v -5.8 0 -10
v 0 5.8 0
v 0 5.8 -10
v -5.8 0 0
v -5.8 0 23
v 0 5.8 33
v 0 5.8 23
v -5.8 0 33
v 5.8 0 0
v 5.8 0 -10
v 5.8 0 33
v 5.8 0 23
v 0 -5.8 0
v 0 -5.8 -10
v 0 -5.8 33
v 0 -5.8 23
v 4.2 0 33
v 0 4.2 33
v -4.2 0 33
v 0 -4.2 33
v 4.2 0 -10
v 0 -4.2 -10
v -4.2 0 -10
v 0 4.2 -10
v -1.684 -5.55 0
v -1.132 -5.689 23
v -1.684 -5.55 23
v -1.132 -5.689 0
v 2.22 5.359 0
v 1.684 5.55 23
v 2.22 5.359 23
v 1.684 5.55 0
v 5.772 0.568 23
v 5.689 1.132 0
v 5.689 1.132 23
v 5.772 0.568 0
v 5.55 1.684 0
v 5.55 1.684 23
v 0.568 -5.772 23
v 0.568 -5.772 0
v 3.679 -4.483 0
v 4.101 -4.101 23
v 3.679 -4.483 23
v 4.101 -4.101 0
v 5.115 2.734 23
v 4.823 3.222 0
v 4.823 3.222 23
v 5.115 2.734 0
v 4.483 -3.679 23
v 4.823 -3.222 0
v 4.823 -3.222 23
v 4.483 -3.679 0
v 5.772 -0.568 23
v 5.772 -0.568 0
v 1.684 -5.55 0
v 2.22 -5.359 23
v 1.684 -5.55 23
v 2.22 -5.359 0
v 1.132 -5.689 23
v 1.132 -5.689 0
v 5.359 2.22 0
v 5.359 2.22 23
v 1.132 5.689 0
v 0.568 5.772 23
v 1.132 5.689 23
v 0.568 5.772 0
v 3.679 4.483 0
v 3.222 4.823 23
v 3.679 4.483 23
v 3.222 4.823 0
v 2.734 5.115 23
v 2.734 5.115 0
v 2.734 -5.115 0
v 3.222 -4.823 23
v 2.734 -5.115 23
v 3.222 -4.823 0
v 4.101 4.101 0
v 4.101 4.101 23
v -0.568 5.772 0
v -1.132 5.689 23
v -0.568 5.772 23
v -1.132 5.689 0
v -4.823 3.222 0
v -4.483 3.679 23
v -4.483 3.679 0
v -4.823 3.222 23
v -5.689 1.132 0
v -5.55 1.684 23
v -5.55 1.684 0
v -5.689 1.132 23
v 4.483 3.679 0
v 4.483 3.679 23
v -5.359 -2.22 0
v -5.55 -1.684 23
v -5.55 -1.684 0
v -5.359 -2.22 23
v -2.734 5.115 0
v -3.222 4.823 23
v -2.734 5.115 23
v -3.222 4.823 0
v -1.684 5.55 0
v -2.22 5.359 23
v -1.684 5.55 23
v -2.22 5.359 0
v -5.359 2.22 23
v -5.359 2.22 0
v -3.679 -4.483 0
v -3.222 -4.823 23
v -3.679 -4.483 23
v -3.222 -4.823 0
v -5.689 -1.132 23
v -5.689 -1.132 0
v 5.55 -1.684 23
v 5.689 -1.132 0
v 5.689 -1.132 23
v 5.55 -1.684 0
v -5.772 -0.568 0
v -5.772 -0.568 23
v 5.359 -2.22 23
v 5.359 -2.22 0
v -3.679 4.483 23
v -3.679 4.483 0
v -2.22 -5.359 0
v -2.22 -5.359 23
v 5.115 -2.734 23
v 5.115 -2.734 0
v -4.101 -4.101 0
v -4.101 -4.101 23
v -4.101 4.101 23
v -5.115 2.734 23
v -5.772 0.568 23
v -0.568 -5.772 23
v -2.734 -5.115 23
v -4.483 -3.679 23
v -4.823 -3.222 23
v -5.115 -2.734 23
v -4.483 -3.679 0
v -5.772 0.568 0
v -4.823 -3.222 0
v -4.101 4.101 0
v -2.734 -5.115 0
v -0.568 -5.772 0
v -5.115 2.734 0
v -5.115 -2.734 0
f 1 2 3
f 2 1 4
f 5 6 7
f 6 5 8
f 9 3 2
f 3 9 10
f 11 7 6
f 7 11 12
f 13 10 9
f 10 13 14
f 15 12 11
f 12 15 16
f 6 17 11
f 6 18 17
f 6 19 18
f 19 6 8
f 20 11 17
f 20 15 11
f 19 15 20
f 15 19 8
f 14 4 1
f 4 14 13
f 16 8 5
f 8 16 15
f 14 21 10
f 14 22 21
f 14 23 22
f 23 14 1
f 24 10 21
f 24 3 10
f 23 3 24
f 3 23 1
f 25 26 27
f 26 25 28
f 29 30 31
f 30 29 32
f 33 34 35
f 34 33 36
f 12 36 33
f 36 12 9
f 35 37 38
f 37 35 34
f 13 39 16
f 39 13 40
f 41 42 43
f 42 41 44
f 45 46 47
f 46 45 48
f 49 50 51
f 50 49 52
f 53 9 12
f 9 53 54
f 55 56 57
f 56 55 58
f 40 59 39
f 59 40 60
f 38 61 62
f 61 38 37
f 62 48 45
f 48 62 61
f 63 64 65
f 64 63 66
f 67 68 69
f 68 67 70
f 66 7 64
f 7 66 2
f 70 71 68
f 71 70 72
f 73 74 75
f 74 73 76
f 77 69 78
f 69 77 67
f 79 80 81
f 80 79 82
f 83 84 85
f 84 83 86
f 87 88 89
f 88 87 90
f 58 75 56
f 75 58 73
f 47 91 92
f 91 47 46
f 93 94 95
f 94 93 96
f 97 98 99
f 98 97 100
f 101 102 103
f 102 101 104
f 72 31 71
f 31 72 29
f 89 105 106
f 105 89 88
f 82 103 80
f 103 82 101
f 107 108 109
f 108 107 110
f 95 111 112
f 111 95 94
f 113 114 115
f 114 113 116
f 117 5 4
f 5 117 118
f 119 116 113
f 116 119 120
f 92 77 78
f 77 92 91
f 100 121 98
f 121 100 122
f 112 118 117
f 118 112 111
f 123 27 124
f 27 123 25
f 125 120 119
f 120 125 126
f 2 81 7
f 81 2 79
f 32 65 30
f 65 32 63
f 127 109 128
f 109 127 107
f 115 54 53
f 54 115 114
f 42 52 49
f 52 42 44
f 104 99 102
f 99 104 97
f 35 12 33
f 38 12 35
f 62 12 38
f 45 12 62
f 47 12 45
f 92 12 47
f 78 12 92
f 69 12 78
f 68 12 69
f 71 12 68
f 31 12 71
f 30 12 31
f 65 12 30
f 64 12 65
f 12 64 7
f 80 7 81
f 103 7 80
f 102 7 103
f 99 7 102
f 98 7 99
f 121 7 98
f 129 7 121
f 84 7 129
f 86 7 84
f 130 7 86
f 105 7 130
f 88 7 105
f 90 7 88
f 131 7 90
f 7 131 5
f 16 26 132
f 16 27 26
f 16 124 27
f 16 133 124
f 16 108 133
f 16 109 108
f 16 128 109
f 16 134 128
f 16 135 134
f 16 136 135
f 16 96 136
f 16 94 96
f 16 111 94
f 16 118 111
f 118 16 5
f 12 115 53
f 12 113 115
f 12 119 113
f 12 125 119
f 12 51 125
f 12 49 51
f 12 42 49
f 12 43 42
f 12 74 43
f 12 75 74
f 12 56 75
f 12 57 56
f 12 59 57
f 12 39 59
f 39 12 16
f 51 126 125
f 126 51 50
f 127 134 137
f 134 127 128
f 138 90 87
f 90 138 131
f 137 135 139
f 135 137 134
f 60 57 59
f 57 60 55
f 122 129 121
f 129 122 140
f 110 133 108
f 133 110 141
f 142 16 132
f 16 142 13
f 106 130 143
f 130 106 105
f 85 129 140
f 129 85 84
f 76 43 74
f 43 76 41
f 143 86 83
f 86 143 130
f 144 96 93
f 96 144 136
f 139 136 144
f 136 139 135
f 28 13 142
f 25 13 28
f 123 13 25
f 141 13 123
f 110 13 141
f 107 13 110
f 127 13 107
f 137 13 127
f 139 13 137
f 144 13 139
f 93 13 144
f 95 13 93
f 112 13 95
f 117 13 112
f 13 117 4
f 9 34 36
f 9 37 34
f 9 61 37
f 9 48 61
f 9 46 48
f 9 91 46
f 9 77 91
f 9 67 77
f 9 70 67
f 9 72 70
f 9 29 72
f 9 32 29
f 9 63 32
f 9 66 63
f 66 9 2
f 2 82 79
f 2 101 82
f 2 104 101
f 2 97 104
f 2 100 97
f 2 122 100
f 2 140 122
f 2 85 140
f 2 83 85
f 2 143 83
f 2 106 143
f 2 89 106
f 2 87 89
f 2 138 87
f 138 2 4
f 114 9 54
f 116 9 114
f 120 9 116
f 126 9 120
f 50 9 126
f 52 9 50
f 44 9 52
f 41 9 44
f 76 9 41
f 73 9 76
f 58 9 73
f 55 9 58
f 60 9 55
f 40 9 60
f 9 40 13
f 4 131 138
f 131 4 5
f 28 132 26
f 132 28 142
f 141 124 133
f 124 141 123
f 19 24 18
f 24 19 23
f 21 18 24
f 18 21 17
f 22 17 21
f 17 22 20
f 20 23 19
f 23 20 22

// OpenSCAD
$fn=64;
t=1.6;
r=20;
ct=17;

baseWidth=300;
baseHeight=130;

positions=[
  [-baseWidth/2,-baseHeight/2,0],
  [0,baseHeight/2,0],
  [baseWidth/2,-baseHeight/2,0]
];

a=20;
angles=[a,0,-a];
masks=["./Monomon_-_Mask_centered.stl", "./Lurien_-_Mask_centered.stl", "./Herrah_-_Mask_centered.stl"];

postBaseR=6;

holeFudge=0.2;
nutR=3.2;
screwR=1.75;

powerPlitterBox_ix=21;
powerPlitterBox_iy=21;
powerPlitterBox_iz=15;

// color("blue") translate([0,-236,-2]) cube([10,150,2]);
// color("blue") translate([0,84,-2]) cube([10,80,2]);
// color("blue") translate([170,-70,-2]) cube([80,10,2]);

// translate([0,0,25]) color("white") masks();

// translate([-250,-236,0]) canvas();
// translate([0,0,5]) color("gray") backMount();
// translate([0,0,15]) holes() connector();

post();
// lightHolder();

//  color("white") postLight();
// postMaskConnection();
// glueCross();


// translate([0,0,10]) difference() {
//    mask();
//   cube([1000,1000,1000]);
//  }

// translate([0,0,10]) mountHelper();

// canvasBracket();
// translate([0,70,0] ) canvasBracketShort();
//  powerSplitterBox();
//  color("green") translate([powerPlitterBox_ix+t*2,0,powerPlitterBox_iz+t*2]) rotate([0,180,0]) powerSplitterBoxLid();

module powerSplitterBox() {
  ix=powerPlitterBox_ix;
  iy=powerPlitterBox_iy;
  iz=powerPlitterBox_iz;
  difference() {
    cube([ix+t*2,iy+t*2,iz+t]);
    translate([t,t,t]) cube([ix,iy,iz+1]);
    translate([t+3,-1,t+4]) cube([10,10,20]);
    translate([9.7,iy-3,t+10]) cube([5,7,12.2]);
  }
}

module powerSplitterBoxLid() {
  ix=powerPlitterBox_ix;
  iy=powerPlitterBox_iy;
  difference() {
    union() {
      cube([ix+t*2,iy+t*2,t]);
      translate([ix-10+t-3,0,t]) cube([10,t,5]);
      translate([t,t,t]) difference() {
          cube([ix,iy,10]);
          translate([t,t,-0.1]) cube([ix-t*2,iy-t*2,10.2]);
          translate([8,-1,0]) cube([10,5,20]);
      }
    }
    translate([9.5,iy-5,-0.1]) cube([5,9,12.2]);
    translate([6,iy-7.5,-0.1]) cube([14,3,12.2]);
  }
}

module canvasBracket() {
  difference() {
    union() {
      cube([90,40,t]);
      translate([0,7,0]) bracketBracket();
      translate([0,33-t,0]) bracketBracket();
      translate([-t,-5,0]) cube([t,50,10]);
      translate([-t,-5,5]) rotate([0,90,0]) cylinder(r=5,h=t+3);
      translate([-t,45,5]) rotate([0,90,0]) cylinder(r=5,h=t+3);
    }
    translate([60,20,-0.1]) cylinder(r=5,h=t+0.2);
    translate([60,15,-0.1]) cube([30.1,10,t+0.2]);
    translate([30,20,-0.1]) cylinder(r=5,h=t+0.2);
    translate([-0.1,15,-0.1]) cube([30.1,10,t+0.2]);

    translate([-t-0.1,-5,5]) rotate([0,90,0]) cylinder(r=2,h=10);
    translate([-t-0.1,45,5]) rotate([0,90,0]) cylinder(r=2,h=10);
    translate([0,-5,5]) rotate([0,90,0]) cylinder(r1=2, r2=3.5, h=3.1);
    translate([0,45,5]) rotate([0,90,0]) cylinder(r1=2, r2=3.5,h=3.1);
  }
}


module canvasBracketShort() {
  difference() {
    union() {
      cube([70,40,t]);
      translate([0,7,0]) bracketBracket(20);
      translate([0,33-t,0]) bracketBracket(20);
      translate([-t,-5,0]) cube([t,50,10]);
      translate([-t,-5,5]) rotate([0,90,0]) cylinder(r=5,h=t+3);
      translate([-t,45,5]) rotate([0,90,0]) cylinder(r=5,h=t+3);
    }
    translate([50,20,-0.1]) cylinder(r=5,h=t+0.2);
    translate([50,15,-0.1]) cube([30.1,10,t+0.2]);
    translate([20,20,-0.1]) cylinder(r=5,h=t+0.2);
    translate([-0.1,15,-0.1]) cube([20.1,10,t+0.2]);

    translate([-t-0.1,-5,5]) rotate([0,90,0]) cylinder(r=2,h=10);
    translate([-t-0.1,45,5]) rotate([0,90,0]) cylinder(r=2,h=10);
    translate([0,-5,5]) rotate([0,90,0]) cylinder(r1=2, r2=3.5, h=3.1);
    translate([0,45,5]) rotate([0,90,0]) cylinder(r1=2, r2=3.5,h=3.1);
  }
}

module bracketBracket(l=30) {
  cube([l,t,5]);
  translate([l,0,0]) rotate([-90,0,0]) difference() {
    cylinder(r=5,h=t);
    translate([-5,-0.1,-0.1]) cube([10,10,t+0.2]);
  }
}

module glueCross() {
  difference() {
    union() {
      linear_extrude(t) projection() hull() mask();
      cylinder(r=postBaseR-holeFudge,h=5, $fn=4);
    }
    translate([5,5,-1]) cube([1000,1000,10]);
    translate([-1005,-1005,-1]) cube([1000,1000,10]);
    translate([-1005,5,-1]) cube([1000,1000,10]);
    translate([5,-1005,-1]) cube([1000,1000,10]);
  }
  color("blue") difference() {
    scale([1.02,1.02,1]) linear_extrude(5) projection() hull() mask();
    translate([0,0,-0.1]) linear_extrude(5.2) projection() hull() mask(); 
  }
}

module connector() {
  color("black") post();
  color("white") postLight();
  color("black") postMaskConnection();
}

module backMount() {
  difference() {
    triangle() cylinder(r=r,h=10);
    translate([0,0,-0.1]) holes()  cylinder(r=postBaseR+holeFudge,h=100,$fn=4);
  }
}

module mountHelper() {
  or=postBaseR+t; 
  ir=postBaseR; 
  difference() {
    cylinder(r=or,h=38+t, $fn=4);
    translate([0,0,-1]) cylinder(r=ir,h=40+t, $fn=4);
  }
}

module postLight() {
  or=postBaseR+t; 
  ir=postBaseR; 

  translate([0,0,46]) difference() {
      union() {
      difference() {
        union() {
          cylinder(r=or,h=t*2+0.5);
          translate([0,0,t*2+0.5]) cylinder(r=or+t*2,h=t);
          translate([0,0,t*3+0.5]) cylinder(r=or+1.5,h=t);
        }
        translate([0,0,t*3]) cylinder(r=ir,h=t*1.5, $fn=4);
        translate([0,0,-0.1]) cylinder(r=screwR,h=10);
      }
      translate([0,0,-18]) difference() {
        cylinder(r=or,h=18);
        translate([0,0,10]) cylinder(r=ir,h=40);
        translate([0,0,-0.1]) cylinder(r=ir,h=10.2, $fn=4);
      }
      translate([0,0,t-11]) difference() {
        union() {
          translate([0,0,t]) cylinder(r=9+t,h=t);
          translate([0,0,-t]) cylinder(r1=or, r2=9+t, h=t*2);
        }
        translate([0,0,t]) cylinder(r=9,h=t+0.1);
        translate([0,0,-t-0.1]) cylinder(r=ir,h=10.2);
      }
    }
    translate([-3,-2,-8]) cube([6,10,8]);
  }
}

module postMaskConnection() {
  or=postBaseR-holeFudge;
  // translate([0,0,t]) color("silver") difference() {
  //    cylinder(r=nutR,h=2.5,$fn=6);
  //    translate([0,0,-0.1]) cylinder(r=screwR,h=3);
  // }
  translate([0,0,48]) difference() {
    union() {
      translate([0,0,0]) cylinder(r=or,h=t, $fn=4);
      translate([0,0,t]) cylinder(r=postBaseR+t+1.5,h=t);

      // translate([0,0,t]) cylinder(r=10,h=t*3);
     
      // translate([0,0,0]) difference() {
      //   cylinder(r=20,h=5);
      //   translate([0,0,-0.1]) cylinder(r=10,h=40);
      //   translate([-20,-40,-1]) cube([40,40,40]);
      // }
    }
    //translate([0,0,t]) cylinder(r=nutR,h=50, $fn=6);
    translate([0,0,-t-1]) cylinder(r=screwR,h=50);
    // translate([0,0,-38]) mask();
  }
  
}


module lightHolder() {
  br=(postBaseR-holeFudge)*sqrt(2)/2;
  sr=(postBaseR-t-holeFudge)*sqrt(2)/2;
  difference() {
    union() {
      cylinder(r=br,h=t);
      translate([0,0,-t]) cylinder(r=sr,h=t);
    }
    translate([-1.25,-2,-5]) cube([2.5,10,20]);
  }
}

module post() {
  or=postBaseR-holeFudge;
  ir=postBaseR-t-holeFudge;
  // postH=45;
  postH=43;
  translate([0,0,-10]) difference() {
    union() {
      cylinder(r=or,h=postH,$fn=4);
      translate([0,0,10]) cylinder(r=or,h=postH-20);
    }
    translate([0,0,-0.1]) cylinder(r=ir,h=postH+0.2,$fn=4);
  }
}


module holes() {
  for(pos1=[0:len(positions)-1]) {
    translate(positions[pos1]) rotate(angles[pos1]) children();
  }
}

module canvas() {

    color("black") {
      difference() {
        cube([500,400,ct]);
        translate([1,1,-1]) cube([500-2,400-2,ct]);
      }
    }
    translate([1,1,0]) {
      cube([500-2,40,ct-1]);
      translate([0,400-40-2,0]) cube([500-2,40,ct-1]);
      cube([40,400-2,ct-1]);
      translate([500-40-2,0,0]) cube([40,400-2,ct-1]);
    }

}

module masks() {
  translate(positions[0]) rotate([0,0,angles[0]]) mask(0);
  translate(positions[1]) rotate([0,0,angles[1]]) mask(1);
  translate(positions[2]) rotate([0,0,angles[2]]) mask(2);
}

module mask(num=1) {
  translate([0,-45,0]) scale([2,2,2]) import(masks[num]);
}

module triangle() {
  for(pos1=[0:len(positions)-1]) {
    pos2=(pos1+1)%len(positions);
    hull() {
      translate(positions[pos1]) children();
      translate(positions[pos2]) children();
    }
  }
}
